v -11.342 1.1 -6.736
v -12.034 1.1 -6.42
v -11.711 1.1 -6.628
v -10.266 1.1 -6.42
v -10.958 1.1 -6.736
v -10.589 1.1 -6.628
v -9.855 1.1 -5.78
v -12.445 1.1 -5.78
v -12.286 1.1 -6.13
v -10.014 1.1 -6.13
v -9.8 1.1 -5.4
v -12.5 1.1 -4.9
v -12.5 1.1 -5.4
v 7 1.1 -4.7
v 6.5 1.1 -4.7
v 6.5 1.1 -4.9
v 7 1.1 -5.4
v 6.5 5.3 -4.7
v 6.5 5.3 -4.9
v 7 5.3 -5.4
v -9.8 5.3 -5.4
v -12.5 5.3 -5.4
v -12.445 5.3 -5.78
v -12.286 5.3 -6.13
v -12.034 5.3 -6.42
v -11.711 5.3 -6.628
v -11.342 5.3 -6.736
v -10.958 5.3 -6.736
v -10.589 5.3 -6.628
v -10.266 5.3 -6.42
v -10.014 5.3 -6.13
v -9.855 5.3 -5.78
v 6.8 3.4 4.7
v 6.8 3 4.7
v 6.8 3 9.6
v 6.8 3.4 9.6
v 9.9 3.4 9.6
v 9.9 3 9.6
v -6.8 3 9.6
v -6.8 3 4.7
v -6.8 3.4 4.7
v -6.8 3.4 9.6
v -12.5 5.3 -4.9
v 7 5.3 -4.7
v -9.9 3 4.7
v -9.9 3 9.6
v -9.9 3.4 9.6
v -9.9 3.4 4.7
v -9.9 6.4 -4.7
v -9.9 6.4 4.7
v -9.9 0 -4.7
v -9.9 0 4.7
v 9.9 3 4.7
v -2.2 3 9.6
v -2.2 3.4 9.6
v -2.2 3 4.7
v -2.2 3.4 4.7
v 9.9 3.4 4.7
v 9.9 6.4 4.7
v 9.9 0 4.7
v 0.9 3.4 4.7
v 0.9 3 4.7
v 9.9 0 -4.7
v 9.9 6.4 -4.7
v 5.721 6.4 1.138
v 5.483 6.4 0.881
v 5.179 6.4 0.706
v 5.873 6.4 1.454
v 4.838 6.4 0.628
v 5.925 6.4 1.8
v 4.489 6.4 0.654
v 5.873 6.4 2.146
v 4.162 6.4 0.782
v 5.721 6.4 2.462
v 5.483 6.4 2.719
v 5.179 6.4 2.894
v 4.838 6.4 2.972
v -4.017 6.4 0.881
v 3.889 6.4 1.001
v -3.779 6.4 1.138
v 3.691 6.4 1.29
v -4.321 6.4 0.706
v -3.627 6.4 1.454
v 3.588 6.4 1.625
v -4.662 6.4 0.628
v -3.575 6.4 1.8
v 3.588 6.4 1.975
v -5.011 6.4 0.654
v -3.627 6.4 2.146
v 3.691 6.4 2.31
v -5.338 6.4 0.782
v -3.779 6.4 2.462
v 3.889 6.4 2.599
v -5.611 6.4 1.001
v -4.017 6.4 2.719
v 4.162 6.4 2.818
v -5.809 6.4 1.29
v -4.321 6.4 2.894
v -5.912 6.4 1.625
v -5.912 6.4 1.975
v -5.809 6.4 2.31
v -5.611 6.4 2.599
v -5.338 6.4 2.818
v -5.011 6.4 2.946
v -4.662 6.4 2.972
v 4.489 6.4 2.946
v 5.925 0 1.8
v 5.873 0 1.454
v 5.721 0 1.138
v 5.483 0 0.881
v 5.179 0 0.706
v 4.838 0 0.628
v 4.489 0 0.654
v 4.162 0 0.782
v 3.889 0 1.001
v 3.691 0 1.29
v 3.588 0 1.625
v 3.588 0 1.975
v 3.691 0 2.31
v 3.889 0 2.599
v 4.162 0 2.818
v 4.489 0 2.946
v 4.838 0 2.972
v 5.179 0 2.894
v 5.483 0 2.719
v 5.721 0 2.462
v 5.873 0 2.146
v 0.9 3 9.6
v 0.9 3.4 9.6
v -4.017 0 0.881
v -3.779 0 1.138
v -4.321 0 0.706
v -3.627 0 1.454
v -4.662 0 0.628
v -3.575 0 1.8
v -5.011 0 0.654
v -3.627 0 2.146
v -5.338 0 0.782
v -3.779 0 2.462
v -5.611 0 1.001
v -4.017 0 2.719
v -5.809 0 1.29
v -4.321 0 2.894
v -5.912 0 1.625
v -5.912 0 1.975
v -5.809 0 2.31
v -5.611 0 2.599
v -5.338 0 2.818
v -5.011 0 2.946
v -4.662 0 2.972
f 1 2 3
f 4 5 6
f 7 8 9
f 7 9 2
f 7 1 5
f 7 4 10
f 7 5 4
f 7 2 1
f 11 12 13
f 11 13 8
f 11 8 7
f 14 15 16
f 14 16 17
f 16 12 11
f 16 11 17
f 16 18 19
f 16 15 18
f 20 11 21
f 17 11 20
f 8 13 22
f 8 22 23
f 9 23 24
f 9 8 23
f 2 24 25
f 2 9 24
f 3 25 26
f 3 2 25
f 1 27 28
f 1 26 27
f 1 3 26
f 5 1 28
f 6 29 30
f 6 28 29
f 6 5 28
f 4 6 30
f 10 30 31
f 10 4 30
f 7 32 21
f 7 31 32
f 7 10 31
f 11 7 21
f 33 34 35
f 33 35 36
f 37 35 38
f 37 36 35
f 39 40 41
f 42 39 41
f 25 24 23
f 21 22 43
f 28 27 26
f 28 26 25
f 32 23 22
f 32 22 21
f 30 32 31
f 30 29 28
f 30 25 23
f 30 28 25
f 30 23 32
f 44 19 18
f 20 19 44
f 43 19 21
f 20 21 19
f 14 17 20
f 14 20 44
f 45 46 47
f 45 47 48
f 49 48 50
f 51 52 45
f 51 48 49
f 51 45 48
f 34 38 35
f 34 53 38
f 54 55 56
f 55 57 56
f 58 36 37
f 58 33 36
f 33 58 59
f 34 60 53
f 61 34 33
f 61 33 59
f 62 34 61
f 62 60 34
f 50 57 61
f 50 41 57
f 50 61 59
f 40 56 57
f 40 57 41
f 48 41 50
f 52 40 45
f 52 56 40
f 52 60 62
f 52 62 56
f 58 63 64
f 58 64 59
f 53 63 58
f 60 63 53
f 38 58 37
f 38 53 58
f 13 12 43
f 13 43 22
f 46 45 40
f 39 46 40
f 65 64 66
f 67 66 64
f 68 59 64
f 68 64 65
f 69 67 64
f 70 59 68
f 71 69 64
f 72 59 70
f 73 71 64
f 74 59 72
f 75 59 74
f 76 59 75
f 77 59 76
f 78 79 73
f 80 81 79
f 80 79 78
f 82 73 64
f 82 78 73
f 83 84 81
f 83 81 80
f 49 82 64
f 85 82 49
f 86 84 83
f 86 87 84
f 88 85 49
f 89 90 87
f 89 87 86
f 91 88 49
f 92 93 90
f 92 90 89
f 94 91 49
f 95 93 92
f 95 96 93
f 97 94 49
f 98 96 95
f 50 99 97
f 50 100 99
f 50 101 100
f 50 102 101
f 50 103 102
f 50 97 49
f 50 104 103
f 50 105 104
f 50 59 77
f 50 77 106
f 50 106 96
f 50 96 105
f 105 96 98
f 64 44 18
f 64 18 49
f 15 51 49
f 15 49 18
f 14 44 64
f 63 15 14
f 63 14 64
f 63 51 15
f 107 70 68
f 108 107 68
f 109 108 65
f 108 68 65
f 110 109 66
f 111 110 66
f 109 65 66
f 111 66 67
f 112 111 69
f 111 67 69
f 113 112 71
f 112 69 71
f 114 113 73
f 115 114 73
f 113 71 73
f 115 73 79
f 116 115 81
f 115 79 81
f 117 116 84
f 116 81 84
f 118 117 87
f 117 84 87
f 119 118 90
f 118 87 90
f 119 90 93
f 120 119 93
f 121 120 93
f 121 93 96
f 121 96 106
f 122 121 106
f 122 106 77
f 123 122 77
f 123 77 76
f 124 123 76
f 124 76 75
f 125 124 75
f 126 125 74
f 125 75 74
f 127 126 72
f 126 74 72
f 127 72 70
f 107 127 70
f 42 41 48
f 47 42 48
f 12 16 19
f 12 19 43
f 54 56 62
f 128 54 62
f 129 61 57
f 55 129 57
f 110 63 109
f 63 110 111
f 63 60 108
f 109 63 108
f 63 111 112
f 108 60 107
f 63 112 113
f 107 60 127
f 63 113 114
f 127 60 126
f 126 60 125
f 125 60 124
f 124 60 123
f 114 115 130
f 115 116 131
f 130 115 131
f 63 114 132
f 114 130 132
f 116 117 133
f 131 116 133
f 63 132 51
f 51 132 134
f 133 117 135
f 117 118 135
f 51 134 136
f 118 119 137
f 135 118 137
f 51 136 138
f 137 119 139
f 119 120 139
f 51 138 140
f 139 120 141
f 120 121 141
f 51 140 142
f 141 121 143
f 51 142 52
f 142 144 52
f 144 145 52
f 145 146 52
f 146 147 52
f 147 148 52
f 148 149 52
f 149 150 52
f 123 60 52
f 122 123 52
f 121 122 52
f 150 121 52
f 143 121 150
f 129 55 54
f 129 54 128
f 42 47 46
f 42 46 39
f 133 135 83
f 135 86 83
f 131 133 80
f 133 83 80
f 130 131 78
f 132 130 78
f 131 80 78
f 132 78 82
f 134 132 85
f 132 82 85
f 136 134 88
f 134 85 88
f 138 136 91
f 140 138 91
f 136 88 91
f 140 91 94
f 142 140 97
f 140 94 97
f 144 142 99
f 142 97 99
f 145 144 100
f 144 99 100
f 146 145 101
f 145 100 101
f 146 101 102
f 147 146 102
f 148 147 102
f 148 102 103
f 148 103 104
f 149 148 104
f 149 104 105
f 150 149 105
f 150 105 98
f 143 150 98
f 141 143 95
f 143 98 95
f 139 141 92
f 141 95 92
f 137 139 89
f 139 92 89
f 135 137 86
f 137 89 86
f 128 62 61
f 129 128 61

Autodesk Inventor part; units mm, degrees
ref_plane "YZ Plane" through (0, 0, 0) normal (1, 0, 0) x (0, 1, 0)
ref_plane "XZ Plane" through (0, 0, 0) normal (0, 1, 0) x (-1, 0, 0)
ref_plane "XY Plane" through (0, 0, 0) normal (0, 0, 1) x (1, 0, 0)
sketch "Sketch1" plane through (0, 0, 0) normal (0, 1, 0) x (-1, 0, 0)
  line L0 (-9.9, 4.7) -> (9.9, 4.7)
  line L1 (9.9, 4.7) -> (9.9, -4.7)
  line L2 (9.9, -4.7) -> (-9.9, -4.7)
  line L3 (-9.9, -4.7) -> (-9.9, 4.7)
  line L4 (-9.9, 4.7) -> (9.9, -4.7) construction
  line L5 (9.9, 4.7) -> (-9.9, -4.7) construction
  line L6 (12.5, -5.4) -> (-6.5, -5.4)
  line L7 (-6.5, -5.4) -> (-6.5, -4.9)
  line L8 (-6.5, -4.9) -> (12.5, -4.9)
  line L9 (12.5, -4.9) -> (12.5, -5.4)
  line L10 (-6.5, -5.4) -> (-7, -5.4)
  line L11 (-7, -5.4) -> (-7, -4.7)
  line L12 (-7, -4.7) -> (-6.5, -4.7)
  line L13 (-6.5, -4.7) -> (-6.5, -5.4)
  arc A0 (12.5, -5.4) -> (9.8, -5.4) centre (11.15, -5.4) ccw construction
  arc A1 (9.8, -5.4) -> (12.5, -5.4) centre (11.15, -5.4) ccw
  point P0 (0, 0)
  point P1 (-7, -5.05)
  dimension "d0" = 19.8
  dimension "d1" = 9.4
  dimension "d2" = 0.5
  dimension "d3" = 0.5
  dimension "d4" = 0.7
  dimension "d5" = 19
  dimension "d6" = 2.7
  dimension "d7" = 2.9
extrude "Extrusion1" add sketch "Sketch1" along normal blind 6.4
sketch "Sketch3" plane through (-9.9, 0, 4.7) normal (0, 0, 1) x (1, 0, 0)
  line L0 (0, 3) -> (3.1, 3)
  line L1 (3.1, 3) -> (3.1, 3.4)
  line L2 (3.1, 3.4) -> (0, 3.4)
  line L3 (0, 3.4) -> (0, 3)
  line L4 (7.7, 3) -> (10.8, 3)
  line L5 (10.8, 3) -> (10.8, 3.4)
  line L6 (10.8, 3.4) -> (7.7, 3.4)
  line L7 (7.7, 3.4) -> (7.7, 3)
  line L8 (16.7, 3.4) -> (19.8, 3.4)
  line L9 (19.8, 3.4) -> (19.8, 3)
  line L10 (19.8, 3) -> (16.7, 3)
  line L11 (16.7, 3) -> (16.7, 3.4)
  line L12 (-2.6, 6.4) -> (16.4, 6.4) projected
  line L13 (19.8, 0) -> (16.9, 0) projected
  line L14 (-2.6, 6.4) -> (19.8, 0) construction
  line L15 (19.8, 0) -> (19.8, 6.4) projected
  line L16 (0, 0) -> (0, 6.4) projected
  point P0 (9.9, 0)
  point P1 (0, 3.2)
  point P2 (8.6, 3.2)
  point P3 (19.8, 3.2)
  dimension "d10" = 3.1
  dimension "d11" = 0.4
  dimension "d12" = 9
extrude "Extrusion2" add sketch "Sketch3" along normal blind 4.9
sketch "Sketch4" plane through (0, 6.4, 0) normal (0, 1, 0) x (1, 0, 0)
  line L0 (-12.5, 5.4) -> (-12.5, 4.9) projected
  line L1 (-12.5, 4.9) -> (6.5, 4.9) projected
  line L2 (6.5, 4.9) -> (6.5, 4.7) projected
  line L3 (6.5, 4.7) -> (-9.9, 4.7) projected
  line L4 (-9.9, 4.7) -> (-9.9, -4.7) projected
  line L5 (-9.9, -4.7) -> (9.9, -4.7) projected
  line L6 (9.9, -4.7) -> (9.9, 4.7) projected
  line L7 (9.9, 4.7) -> (7, 4.7) projected
  line L8 (7, 4.7) -> (7, 5.4) projected
  line L9 (7, 5.4) -> (-9.8, 5.4) projected
  arc A0 (-9.8, 5.4) -> (-12.5, 5.4) centre (-11.15, 5.4) ccw projected
  line L10 (6.5, 4.9) -> (6.5, 4.7) projected
  line L11 (6.5, 4.7) -> (7, 4.7)
  point P0 (0, 0)
extrude "Extrusion3" cut sketch "Sketch4" against normal blind 0.1 contours A0 L9 L8 L11 L2 L1 L0
sketch "Sketch5" plane through (0, 0, 0) normal (0, -1, 0) x (1, 0, 0)
  line L0 (-12.5, -5.4) -> (-12.5, -4.9) projected
  arc A0 (-12.5, -5.4) -> (-9.8, -5.4) centre (-11.15, -5.4) ccw projected
  line L1 (7, -5.4) -> (-9.8, -5.4) projected
  line L2 (7, -4.7) -> (7, -5.4) projected
  line L3 (9.9, -4.7) -> (7, -4.7) projected
  line L4 (9.9, 4.7) -> (9.9, -4.7) projected
  line L5 (-9.9, 4.7) -> (9.9, 4.7) projected
  line L6 (-9.9, -4.7) -> (-9.9, 4.7) projected
  line L7 (6.5, -4.7) -> (-9.9, -4.7) projected
  line L8 (6.5, -4.9) -> (6.5, -4.7) projected
  line L9 (-12.5, -4.9) -> (6.5, -4.9) projected
  line L10 (7, -4.7) -> (6.5, -4.7) projected
  line L11 (7, -4.7) -> (6.5, -4.7)
  point P0 (0, 0)
extrude "Extrusion4" cut sketch "Sketch5" against normal blind 0.1 contours L0 L9 L8 L10 L2 L1 A0
sketch "Sketch6" plane through (0, 6.4, 0) normal (0, 1, 0) x (1, 0, 0)
  circle A0 centre (-4.75, -1.8) radius 1.175
  circle A1 centre (4.75, -1.8) radius 1.175
  line L0 (-4.75, -1.8) -> (4.75, -1.8) construction
  line L1 (-9.9, -4.7) -> (9.9, -4.7) projected
  point P0 (0, 0)
  point P1 (0, -1.8)
  dimension "d19" = 2.35
  dimension "d20" = 9.5
  dimension "d21" = 2.9
extrude "Extrusion5" cut sketch "Sketch6" against normal up to surface (6.4 mm away)
sketch "Sketch7" plane through (0, 6.3, 0) normal (0, 1, 0) x (1, 0, 0)
  line L0 (6.5, 4.7) -> (6.5, 4.9) projected
  line L1 (7, 4.7) -> (6.5, 4.7) projected
  line L2 (7, 5.4) -> (7, 4.7) projected
  line L3 (-9.8, 5.4) -> (7, 5.4) projected
  arc A0 (-9.8, 5.4) -> (-12.5, 5.4) centre (-11.15, 5.4) ccw projected
  line L4 (-12.5, 4.9) -> (-12.5, 5.4) projected
  line L5 (6.5, 4.9) -> (-12.5, 4.9) projected
  point P0 (0, 0)
extrude "Extrusion6" cut sketch "Sketch7" against normal blind 1
sketch "Sketch8" plane through (0, 0.1, 0) normal (0, -1, 0) x (1, 0, 0)
  line L0 (6.5, -4.7) -> (7, -4.7) projected
  line L1 (6.5, -4.9) -> (6.5, -4.7) projected
  line L2 (-12.5, -4.9) -> (6.5, -4.9) projected
  line L3 (-12.5, -5.4) -> (-12.5, -4.9) projected
  arc A0 (-12.5, -5.4) -> (-9.8, -5.4) centre (-11.15, -5.4) ccw projected
  line L4 (7, -5.4) -> (-9.8, -5.4) projected
  line L5 (7, -4.7) -> (7, -5.4) projected
  point P0 (0, 0)
extrude "Extrusion7" cut sketch "Sketch8" against normal blind 1
properties part number "LimitSwitch_V1" material "Acetal Resin, Black"
